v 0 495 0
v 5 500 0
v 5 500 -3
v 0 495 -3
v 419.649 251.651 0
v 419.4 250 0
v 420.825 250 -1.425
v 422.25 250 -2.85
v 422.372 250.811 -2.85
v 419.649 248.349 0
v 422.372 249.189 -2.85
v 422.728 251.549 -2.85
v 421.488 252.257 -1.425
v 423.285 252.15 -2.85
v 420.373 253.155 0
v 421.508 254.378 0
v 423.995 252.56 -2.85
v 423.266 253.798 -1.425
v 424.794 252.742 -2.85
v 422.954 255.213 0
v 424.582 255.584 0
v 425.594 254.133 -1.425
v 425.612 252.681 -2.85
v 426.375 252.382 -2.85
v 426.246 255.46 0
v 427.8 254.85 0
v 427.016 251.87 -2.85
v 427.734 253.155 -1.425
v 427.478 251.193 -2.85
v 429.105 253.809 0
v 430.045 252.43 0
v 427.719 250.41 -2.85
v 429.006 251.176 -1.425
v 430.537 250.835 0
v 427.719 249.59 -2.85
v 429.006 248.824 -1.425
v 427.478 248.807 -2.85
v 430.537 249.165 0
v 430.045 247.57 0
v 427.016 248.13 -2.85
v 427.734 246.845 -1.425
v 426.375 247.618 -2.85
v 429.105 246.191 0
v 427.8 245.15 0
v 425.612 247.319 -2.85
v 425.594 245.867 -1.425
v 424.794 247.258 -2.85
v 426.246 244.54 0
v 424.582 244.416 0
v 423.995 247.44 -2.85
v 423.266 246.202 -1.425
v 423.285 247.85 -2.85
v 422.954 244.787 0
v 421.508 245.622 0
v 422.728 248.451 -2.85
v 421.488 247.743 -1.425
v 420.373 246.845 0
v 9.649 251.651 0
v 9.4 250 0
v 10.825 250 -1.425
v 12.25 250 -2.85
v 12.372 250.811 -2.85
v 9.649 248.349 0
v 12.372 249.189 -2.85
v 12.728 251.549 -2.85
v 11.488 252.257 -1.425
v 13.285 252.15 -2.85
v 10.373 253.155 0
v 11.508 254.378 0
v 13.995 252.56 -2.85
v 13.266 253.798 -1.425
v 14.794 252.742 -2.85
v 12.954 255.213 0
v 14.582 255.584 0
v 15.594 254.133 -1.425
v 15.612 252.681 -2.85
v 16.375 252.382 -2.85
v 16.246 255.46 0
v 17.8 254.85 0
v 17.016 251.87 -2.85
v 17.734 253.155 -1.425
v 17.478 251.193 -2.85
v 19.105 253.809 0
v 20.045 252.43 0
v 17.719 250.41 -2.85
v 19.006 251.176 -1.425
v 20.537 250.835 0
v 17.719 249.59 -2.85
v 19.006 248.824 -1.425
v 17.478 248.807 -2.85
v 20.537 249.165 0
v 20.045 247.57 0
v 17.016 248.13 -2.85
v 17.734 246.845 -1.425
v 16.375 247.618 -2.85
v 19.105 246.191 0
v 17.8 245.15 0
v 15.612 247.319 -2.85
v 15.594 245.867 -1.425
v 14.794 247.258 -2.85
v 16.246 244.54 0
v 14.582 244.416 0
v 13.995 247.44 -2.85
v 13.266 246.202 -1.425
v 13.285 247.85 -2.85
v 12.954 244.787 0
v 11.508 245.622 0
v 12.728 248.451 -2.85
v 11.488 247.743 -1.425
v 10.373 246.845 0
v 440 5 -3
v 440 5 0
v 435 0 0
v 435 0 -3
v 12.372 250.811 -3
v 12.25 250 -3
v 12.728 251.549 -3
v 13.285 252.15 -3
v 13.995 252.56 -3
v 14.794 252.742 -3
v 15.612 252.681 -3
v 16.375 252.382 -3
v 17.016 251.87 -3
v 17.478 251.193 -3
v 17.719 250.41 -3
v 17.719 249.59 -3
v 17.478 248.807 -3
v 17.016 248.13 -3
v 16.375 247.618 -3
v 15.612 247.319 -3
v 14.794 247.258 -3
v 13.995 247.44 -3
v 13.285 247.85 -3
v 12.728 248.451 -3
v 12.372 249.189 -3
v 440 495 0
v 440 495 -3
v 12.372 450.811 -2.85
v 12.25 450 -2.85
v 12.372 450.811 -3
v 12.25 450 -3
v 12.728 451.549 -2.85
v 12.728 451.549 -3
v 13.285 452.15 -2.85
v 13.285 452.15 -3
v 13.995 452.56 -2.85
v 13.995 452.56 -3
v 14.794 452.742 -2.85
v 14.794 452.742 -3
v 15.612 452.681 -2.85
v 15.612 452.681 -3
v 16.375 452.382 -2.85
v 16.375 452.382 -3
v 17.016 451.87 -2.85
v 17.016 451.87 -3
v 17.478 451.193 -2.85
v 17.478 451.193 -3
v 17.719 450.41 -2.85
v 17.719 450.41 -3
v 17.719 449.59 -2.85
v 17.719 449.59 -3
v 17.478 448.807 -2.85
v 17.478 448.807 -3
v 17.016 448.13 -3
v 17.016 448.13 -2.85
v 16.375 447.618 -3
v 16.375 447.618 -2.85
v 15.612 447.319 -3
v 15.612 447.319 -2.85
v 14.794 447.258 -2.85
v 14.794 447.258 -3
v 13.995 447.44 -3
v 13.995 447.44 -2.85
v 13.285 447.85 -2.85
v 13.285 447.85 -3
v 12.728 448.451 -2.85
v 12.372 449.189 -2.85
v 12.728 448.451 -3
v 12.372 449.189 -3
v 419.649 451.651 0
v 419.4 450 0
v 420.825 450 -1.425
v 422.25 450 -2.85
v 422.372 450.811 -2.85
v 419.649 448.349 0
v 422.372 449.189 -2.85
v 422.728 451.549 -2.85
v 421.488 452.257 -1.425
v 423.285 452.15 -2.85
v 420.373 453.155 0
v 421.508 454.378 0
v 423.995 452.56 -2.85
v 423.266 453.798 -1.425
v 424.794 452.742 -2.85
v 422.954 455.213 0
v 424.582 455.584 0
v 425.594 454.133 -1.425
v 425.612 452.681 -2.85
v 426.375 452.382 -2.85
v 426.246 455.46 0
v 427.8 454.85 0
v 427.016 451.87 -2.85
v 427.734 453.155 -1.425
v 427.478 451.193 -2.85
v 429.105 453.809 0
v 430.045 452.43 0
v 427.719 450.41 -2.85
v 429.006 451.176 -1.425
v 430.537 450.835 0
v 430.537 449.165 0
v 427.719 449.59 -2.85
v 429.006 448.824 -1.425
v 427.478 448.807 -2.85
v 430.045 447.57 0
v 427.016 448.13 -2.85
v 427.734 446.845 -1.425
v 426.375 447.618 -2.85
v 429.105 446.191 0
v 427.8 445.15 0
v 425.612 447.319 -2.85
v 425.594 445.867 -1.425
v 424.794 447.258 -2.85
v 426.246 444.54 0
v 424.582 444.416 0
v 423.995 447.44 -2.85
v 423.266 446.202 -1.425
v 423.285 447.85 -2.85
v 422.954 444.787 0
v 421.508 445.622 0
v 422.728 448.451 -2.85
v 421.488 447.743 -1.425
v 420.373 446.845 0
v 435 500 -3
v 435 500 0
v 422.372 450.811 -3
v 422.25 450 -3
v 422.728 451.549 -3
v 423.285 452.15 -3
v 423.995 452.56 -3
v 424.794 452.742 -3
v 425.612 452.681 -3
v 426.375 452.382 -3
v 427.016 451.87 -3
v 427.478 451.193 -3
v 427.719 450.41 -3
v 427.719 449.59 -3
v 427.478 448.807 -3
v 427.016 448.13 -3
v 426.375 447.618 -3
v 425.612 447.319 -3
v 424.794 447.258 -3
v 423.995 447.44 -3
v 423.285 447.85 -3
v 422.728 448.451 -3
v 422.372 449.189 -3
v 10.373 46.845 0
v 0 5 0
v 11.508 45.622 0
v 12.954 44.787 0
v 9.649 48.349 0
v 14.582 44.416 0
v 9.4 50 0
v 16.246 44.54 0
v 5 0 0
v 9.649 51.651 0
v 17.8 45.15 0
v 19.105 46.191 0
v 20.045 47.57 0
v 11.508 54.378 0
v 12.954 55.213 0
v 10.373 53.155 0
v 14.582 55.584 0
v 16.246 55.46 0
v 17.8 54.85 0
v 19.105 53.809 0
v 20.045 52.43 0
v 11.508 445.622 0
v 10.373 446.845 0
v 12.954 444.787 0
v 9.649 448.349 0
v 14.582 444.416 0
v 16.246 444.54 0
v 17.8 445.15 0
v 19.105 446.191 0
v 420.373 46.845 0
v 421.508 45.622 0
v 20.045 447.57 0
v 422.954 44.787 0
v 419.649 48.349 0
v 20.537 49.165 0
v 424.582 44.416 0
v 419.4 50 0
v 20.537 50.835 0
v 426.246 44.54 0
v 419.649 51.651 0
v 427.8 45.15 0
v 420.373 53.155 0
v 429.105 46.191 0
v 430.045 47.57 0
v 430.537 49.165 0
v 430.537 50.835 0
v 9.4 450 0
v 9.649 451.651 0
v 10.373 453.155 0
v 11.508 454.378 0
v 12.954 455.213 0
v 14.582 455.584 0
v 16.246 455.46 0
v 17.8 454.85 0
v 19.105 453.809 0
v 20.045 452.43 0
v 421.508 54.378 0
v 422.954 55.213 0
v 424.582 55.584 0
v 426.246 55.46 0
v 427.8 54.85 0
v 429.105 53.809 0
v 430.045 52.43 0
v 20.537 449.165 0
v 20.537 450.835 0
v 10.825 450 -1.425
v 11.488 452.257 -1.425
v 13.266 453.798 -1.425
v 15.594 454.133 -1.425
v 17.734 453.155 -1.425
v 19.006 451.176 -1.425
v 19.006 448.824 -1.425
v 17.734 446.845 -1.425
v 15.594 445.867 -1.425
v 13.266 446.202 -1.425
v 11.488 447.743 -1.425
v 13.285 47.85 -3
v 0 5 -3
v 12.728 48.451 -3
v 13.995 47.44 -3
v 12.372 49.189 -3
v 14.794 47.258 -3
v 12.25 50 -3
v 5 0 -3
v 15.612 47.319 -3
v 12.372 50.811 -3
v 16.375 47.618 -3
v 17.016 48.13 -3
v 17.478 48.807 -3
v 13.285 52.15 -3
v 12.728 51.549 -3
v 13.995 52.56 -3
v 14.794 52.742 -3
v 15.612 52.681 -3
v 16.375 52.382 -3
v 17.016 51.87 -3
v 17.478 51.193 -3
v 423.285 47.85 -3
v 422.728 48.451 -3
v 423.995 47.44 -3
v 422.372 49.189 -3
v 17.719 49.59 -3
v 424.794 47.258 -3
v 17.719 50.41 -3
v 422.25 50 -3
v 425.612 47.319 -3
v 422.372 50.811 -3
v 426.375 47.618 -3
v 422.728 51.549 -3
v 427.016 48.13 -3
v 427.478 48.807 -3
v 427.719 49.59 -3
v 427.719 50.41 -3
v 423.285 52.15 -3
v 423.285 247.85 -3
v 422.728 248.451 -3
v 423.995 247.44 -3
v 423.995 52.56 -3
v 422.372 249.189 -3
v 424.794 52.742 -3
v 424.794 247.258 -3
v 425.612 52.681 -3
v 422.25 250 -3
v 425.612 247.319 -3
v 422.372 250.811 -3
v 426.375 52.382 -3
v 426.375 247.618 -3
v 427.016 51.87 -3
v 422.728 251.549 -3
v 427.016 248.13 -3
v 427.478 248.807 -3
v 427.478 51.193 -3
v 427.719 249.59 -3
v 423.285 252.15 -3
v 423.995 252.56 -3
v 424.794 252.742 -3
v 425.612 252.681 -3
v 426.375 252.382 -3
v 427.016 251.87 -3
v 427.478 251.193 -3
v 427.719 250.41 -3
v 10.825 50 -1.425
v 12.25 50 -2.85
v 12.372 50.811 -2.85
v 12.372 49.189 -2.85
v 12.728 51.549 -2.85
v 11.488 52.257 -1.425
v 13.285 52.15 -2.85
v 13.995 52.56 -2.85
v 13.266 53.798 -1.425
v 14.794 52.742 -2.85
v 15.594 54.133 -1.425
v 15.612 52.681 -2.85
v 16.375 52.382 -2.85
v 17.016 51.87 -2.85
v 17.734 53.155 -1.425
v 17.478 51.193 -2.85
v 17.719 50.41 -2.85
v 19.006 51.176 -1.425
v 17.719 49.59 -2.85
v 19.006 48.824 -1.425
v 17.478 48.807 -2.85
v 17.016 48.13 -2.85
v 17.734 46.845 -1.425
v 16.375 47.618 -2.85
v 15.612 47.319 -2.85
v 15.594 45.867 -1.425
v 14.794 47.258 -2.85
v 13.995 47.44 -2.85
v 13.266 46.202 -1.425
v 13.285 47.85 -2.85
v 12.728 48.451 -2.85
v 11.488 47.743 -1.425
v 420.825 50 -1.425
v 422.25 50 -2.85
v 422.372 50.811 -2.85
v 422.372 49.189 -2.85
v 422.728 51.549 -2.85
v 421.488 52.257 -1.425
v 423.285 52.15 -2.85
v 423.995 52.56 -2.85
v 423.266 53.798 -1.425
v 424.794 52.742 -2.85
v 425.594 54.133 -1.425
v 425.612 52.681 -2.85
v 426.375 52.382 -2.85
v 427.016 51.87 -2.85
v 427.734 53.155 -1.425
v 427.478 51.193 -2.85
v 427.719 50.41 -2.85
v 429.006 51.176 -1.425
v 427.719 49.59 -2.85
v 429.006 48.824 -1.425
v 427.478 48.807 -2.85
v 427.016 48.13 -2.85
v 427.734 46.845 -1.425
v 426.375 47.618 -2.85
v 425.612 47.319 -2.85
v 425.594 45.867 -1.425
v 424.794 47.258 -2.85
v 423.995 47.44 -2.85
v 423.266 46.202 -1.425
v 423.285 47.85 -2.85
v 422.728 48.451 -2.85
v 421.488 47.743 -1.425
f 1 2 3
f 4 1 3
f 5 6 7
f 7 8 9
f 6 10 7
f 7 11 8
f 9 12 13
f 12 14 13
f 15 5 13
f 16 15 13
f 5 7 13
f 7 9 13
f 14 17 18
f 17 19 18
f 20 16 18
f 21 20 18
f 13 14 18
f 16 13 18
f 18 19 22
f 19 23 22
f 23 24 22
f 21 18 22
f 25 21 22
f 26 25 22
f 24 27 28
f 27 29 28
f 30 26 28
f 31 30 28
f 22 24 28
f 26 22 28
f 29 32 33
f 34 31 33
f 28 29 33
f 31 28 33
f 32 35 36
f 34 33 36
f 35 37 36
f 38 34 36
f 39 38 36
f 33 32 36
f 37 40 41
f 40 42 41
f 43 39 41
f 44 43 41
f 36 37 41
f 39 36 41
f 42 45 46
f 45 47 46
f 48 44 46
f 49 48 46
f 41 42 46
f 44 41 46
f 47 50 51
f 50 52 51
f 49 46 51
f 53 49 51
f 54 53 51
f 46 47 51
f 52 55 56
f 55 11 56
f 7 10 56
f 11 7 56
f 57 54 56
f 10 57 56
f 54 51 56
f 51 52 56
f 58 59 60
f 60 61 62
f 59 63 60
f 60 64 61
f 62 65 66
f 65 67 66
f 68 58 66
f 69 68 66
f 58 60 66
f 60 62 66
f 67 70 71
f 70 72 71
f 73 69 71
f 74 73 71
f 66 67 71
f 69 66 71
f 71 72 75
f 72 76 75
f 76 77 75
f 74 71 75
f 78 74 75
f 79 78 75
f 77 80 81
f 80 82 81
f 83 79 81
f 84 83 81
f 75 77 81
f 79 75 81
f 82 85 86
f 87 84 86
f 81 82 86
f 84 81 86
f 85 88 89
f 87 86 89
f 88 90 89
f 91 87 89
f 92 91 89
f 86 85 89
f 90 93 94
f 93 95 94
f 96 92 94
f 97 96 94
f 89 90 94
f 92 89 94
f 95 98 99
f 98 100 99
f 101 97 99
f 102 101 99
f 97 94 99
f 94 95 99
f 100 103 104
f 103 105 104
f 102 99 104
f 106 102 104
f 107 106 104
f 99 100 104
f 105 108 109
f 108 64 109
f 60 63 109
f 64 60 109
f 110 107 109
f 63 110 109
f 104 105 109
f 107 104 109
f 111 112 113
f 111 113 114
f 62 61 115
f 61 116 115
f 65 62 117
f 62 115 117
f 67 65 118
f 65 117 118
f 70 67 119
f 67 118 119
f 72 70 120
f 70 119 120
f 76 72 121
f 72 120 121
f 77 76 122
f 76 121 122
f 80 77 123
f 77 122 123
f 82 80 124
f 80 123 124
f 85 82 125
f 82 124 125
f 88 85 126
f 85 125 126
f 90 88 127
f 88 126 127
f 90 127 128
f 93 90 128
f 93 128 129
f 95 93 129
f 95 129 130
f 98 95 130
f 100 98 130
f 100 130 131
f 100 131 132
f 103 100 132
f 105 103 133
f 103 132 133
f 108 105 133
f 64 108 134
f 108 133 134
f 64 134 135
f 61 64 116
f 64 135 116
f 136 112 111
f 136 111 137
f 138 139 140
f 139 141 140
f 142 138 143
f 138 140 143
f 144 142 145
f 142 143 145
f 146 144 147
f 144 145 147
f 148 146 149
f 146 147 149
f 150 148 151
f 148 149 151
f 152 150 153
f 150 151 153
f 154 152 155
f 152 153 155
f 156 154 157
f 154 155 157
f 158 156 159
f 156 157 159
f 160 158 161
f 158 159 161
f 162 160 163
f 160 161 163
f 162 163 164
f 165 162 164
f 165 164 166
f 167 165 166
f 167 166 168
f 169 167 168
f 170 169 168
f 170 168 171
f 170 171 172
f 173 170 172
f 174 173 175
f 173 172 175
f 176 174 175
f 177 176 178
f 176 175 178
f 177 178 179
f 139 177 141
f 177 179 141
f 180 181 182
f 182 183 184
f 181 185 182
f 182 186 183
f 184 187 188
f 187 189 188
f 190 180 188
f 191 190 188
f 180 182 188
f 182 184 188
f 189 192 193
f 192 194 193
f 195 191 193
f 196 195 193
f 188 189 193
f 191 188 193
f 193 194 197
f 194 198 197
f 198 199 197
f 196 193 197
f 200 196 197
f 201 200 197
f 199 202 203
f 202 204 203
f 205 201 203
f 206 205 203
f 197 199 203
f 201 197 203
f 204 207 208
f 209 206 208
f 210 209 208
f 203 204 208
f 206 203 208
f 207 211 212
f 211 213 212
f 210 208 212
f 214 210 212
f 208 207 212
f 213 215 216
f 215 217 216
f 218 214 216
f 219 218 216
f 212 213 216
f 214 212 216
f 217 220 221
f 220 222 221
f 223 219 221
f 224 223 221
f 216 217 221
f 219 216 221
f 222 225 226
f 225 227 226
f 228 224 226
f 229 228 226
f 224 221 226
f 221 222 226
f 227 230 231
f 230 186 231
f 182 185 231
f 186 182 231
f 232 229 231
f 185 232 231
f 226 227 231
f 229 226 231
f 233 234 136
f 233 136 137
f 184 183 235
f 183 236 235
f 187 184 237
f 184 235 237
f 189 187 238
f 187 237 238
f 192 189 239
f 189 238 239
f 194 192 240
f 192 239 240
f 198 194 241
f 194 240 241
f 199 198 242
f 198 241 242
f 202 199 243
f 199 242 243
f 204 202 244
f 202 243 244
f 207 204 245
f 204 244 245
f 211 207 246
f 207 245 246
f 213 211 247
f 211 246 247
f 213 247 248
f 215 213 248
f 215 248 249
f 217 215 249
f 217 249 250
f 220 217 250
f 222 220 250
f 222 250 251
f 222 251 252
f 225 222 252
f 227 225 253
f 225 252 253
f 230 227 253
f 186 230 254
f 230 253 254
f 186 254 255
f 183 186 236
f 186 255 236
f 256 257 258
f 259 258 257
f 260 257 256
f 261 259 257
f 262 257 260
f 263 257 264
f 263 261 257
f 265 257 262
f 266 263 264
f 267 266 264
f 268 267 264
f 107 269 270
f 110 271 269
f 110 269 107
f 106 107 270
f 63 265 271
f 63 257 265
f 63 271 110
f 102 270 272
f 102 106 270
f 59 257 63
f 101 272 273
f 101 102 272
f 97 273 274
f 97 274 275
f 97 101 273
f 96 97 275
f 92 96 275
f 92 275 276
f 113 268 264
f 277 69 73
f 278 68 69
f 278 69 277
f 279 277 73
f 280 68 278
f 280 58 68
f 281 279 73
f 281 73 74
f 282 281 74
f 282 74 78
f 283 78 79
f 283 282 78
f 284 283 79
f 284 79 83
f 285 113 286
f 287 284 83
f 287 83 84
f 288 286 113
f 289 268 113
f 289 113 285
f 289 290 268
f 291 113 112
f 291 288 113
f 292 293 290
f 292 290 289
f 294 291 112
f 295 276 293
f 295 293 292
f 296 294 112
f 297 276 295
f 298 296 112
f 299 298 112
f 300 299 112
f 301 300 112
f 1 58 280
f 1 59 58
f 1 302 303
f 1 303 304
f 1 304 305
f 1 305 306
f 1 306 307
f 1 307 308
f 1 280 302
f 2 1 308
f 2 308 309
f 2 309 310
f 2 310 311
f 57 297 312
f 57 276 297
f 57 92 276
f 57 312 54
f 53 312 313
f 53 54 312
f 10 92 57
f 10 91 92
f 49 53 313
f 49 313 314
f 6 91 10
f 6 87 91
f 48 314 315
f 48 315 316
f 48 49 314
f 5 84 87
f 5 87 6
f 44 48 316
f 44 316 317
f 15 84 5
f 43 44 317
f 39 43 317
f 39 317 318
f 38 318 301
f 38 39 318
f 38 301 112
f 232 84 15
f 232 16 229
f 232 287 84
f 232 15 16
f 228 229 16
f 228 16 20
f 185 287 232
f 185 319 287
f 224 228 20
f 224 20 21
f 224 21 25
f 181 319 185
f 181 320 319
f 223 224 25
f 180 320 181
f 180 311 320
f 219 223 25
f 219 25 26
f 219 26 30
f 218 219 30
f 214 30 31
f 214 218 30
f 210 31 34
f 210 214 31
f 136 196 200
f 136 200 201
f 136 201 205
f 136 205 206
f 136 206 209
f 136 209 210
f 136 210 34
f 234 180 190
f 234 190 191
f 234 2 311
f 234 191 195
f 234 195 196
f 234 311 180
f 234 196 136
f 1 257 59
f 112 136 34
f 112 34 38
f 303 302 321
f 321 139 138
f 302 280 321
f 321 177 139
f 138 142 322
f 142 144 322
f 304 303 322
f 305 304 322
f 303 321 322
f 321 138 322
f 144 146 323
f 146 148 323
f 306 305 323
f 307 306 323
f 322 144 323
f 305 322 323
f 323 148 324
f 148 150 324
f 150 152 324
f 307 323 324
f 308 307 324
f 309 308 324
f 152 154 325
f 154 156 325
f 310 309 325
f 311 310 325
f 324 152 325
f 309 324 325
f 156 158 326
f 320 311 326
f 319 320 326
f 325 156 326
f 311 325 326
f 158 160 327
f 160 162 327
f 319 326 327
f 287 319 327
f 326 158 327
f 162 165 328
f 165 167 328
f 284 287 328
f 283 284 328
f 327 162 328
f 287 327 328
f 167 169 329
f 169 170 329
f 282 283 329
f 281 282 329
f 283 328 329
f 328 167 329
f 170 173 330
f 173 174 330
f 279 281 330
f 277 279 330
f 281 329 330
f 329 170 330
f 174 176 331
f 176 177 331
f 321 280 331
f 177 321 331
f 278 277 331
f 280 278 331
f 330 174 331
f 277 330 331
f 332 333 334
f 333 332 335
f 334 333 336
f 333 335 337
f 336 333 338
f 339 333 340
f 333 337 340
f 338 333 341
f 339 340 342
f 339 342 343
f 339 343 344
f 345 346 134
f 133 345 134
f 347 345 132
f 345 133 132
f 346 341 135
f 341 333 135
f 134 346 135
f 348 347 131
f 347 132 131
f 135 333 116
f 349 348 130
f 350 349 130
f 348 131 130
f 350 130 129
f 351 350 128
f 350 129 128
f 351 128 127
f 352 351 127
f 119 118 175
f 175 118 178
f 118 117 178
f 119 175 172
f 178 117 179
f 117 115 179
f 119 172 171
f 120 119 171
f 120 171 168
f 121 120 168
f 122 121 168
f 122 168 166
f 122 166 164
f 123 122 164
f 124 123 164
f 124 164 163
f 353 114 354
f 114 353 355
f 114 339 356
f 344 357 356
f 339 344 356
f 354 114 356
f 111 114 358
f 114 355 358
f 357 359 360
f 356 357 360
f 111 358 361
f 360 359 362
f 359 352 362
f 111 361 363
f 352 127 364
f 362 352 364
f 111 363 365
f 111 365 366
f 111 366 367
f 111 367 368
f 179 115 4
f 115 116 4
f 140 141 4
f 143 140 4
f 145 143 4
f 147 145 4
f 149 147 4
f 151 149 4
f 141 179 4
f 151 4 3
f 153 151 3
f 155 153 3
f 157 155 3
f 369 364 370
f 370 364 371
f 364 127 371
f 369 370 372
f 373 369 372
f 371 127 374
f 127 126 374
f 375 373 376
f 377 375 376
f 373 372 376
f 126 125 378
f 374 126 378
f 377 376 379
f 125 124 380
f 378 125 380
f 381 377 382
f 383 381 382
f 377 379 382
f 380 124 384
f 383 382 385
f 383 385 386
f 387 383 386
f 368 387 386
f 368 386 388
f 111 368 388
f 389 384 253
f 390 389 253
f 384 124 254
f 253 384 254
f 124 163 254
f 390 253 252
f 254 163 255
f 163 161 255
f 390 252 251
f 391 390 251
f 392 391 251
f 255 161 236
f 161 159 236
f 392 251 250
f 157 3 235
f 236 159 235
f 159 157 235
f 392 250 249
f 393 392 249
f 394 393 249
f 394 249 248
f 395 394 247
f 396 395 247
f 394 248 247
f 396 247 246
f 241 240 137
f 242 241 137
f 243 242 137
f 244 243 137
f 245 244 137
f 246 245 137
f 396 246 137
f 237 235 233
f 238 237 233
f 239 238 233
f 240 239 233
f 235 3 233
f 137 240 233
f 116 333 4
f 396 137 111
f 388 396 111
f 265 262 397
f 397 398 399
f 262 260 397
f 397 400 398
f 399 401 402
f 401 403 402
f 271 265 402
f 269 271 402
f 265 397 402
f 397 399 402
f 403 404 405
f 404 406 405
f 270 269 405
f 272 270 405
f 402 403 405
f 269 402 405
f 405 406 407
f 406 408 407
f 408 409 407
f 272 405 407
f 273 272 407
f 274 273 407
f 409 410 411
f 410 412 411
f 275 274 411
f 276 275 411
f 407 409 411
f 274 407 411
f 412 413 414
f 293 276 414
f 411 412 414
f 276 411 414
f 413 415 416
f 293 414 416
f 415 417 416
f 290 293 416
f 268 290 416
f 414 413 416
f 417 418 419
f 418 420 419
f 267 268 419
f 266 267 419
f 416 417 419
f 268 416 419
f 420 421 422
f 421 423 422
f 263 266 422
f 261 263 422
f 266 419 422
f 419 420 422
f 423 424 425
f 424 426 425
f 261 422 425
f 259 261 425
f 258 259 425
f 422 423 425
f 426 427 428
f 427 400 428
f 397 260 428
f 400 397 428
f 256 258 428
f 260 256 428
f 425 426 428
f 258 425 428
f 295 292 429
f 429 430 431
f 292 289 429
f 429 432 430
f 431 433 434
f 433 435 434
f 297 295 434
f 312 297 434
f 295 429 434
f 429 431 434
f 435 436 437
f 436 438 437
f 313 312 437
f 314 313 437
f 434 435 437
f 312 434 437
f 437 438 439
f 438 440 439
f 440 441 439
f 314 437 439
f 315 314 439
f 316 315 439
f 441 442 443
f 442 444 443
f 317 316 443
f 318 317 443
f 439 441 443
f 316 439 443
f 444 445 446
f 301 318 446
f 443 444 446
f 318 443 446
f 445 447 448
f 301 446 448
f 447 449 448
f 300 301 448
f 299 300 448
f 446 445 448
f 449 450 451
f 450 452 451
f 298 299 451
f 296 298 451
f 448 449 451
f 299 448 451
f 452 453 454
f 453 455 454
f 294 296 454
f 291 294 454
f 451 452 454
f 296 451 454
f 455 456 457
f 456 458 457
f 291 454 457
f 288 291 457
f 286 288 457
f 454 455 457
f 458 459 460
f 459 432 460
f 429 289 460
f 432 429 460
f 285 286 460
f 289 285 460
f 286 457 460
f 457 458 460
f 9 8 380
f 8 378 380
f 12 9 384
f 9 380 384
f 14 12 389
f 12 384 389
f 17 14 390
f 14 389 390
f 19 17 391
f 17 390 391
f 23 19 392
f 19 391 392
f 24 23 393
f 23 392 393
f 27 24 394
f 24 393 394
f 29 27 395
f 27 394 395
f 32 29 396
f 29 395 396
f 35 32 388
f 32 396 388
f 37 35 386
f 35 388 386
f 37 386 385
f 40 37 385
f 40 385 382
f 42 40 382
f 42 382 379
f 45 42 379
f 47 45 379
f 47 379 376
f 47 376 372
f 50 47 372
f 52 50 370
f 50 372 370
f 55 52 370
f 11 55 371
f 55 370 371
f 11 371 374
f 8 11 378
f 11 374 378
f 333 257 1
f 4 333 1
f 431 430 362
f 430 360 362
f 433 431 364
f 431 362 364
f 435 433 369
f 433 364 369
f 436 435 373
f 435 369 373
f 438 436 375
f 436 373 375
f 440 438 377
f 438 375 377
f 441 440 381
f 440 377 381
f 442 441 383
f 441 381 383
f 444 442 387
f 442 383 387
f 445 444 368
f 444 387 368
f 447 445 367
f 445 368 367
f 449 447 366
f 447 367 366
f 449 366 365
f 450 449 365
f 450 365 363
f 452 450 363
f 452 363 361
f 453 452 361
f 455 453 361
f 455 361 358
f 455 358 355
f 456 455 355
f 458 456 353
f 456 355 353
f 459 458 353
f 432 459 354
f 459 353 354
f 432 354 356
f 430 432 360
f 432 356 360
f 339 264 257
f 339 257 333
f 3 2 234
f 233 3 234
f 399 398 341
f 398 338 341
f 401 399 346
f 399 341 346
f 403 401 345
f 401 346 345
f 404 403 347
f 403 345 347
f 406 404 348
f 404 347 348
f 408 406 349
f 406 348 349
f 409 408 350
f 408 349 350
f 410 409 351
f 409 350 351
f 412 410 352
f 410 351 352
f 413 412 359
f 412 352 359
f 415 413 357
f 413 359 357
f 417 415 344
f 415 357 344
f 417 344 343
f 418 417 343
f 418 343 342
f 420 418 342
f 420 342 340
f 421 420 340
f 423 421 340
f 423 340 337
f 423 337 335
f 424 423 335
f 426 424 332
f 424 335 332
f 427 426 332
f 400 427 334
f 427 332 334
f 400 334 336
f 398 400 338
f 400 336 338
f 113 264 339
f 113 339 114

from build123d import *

# Parameters (mm, degrees)
F0_W           = 440
F0_H           = 500
F1_DEPTH       = 3
F2_D           = 5.5
F2_CSINK_D     = 11.2
F2_CSINK_ANGLE = 90
F3_SIZE        = 5


with BuildPart() as f1:
    # F0 (on Top) → F1 (new body)
    with BuildSketch(Plane.XY):
        with Locations((220, 250)):
            Rectangle(F0_W, F0_H)
    extrude(amount=-F1_DEPTH)

    # F2 (through all)
    with Locations(Plane.XY):
        with Locations((425, 50), (425, 250), (425, 450), (15, 450), (15, 250), (15, 50)):
            CounterSinkHole(F2_D / 2, F2_CSINK_D / 2, counter_sink_angle=F2_CSINK_ANGLE)

    # F3
    f3_edges = [f1.edges().sort_by_distance(p)[0] for p in [
        (0, 0, -1.5),
        (440, 0, -1.5),
        (440, 500, -1.5),
        (0, 500, -1.5),
    ]]
    chamfer(f3_edges, length=F3_SIZE)


solid = f1.part
